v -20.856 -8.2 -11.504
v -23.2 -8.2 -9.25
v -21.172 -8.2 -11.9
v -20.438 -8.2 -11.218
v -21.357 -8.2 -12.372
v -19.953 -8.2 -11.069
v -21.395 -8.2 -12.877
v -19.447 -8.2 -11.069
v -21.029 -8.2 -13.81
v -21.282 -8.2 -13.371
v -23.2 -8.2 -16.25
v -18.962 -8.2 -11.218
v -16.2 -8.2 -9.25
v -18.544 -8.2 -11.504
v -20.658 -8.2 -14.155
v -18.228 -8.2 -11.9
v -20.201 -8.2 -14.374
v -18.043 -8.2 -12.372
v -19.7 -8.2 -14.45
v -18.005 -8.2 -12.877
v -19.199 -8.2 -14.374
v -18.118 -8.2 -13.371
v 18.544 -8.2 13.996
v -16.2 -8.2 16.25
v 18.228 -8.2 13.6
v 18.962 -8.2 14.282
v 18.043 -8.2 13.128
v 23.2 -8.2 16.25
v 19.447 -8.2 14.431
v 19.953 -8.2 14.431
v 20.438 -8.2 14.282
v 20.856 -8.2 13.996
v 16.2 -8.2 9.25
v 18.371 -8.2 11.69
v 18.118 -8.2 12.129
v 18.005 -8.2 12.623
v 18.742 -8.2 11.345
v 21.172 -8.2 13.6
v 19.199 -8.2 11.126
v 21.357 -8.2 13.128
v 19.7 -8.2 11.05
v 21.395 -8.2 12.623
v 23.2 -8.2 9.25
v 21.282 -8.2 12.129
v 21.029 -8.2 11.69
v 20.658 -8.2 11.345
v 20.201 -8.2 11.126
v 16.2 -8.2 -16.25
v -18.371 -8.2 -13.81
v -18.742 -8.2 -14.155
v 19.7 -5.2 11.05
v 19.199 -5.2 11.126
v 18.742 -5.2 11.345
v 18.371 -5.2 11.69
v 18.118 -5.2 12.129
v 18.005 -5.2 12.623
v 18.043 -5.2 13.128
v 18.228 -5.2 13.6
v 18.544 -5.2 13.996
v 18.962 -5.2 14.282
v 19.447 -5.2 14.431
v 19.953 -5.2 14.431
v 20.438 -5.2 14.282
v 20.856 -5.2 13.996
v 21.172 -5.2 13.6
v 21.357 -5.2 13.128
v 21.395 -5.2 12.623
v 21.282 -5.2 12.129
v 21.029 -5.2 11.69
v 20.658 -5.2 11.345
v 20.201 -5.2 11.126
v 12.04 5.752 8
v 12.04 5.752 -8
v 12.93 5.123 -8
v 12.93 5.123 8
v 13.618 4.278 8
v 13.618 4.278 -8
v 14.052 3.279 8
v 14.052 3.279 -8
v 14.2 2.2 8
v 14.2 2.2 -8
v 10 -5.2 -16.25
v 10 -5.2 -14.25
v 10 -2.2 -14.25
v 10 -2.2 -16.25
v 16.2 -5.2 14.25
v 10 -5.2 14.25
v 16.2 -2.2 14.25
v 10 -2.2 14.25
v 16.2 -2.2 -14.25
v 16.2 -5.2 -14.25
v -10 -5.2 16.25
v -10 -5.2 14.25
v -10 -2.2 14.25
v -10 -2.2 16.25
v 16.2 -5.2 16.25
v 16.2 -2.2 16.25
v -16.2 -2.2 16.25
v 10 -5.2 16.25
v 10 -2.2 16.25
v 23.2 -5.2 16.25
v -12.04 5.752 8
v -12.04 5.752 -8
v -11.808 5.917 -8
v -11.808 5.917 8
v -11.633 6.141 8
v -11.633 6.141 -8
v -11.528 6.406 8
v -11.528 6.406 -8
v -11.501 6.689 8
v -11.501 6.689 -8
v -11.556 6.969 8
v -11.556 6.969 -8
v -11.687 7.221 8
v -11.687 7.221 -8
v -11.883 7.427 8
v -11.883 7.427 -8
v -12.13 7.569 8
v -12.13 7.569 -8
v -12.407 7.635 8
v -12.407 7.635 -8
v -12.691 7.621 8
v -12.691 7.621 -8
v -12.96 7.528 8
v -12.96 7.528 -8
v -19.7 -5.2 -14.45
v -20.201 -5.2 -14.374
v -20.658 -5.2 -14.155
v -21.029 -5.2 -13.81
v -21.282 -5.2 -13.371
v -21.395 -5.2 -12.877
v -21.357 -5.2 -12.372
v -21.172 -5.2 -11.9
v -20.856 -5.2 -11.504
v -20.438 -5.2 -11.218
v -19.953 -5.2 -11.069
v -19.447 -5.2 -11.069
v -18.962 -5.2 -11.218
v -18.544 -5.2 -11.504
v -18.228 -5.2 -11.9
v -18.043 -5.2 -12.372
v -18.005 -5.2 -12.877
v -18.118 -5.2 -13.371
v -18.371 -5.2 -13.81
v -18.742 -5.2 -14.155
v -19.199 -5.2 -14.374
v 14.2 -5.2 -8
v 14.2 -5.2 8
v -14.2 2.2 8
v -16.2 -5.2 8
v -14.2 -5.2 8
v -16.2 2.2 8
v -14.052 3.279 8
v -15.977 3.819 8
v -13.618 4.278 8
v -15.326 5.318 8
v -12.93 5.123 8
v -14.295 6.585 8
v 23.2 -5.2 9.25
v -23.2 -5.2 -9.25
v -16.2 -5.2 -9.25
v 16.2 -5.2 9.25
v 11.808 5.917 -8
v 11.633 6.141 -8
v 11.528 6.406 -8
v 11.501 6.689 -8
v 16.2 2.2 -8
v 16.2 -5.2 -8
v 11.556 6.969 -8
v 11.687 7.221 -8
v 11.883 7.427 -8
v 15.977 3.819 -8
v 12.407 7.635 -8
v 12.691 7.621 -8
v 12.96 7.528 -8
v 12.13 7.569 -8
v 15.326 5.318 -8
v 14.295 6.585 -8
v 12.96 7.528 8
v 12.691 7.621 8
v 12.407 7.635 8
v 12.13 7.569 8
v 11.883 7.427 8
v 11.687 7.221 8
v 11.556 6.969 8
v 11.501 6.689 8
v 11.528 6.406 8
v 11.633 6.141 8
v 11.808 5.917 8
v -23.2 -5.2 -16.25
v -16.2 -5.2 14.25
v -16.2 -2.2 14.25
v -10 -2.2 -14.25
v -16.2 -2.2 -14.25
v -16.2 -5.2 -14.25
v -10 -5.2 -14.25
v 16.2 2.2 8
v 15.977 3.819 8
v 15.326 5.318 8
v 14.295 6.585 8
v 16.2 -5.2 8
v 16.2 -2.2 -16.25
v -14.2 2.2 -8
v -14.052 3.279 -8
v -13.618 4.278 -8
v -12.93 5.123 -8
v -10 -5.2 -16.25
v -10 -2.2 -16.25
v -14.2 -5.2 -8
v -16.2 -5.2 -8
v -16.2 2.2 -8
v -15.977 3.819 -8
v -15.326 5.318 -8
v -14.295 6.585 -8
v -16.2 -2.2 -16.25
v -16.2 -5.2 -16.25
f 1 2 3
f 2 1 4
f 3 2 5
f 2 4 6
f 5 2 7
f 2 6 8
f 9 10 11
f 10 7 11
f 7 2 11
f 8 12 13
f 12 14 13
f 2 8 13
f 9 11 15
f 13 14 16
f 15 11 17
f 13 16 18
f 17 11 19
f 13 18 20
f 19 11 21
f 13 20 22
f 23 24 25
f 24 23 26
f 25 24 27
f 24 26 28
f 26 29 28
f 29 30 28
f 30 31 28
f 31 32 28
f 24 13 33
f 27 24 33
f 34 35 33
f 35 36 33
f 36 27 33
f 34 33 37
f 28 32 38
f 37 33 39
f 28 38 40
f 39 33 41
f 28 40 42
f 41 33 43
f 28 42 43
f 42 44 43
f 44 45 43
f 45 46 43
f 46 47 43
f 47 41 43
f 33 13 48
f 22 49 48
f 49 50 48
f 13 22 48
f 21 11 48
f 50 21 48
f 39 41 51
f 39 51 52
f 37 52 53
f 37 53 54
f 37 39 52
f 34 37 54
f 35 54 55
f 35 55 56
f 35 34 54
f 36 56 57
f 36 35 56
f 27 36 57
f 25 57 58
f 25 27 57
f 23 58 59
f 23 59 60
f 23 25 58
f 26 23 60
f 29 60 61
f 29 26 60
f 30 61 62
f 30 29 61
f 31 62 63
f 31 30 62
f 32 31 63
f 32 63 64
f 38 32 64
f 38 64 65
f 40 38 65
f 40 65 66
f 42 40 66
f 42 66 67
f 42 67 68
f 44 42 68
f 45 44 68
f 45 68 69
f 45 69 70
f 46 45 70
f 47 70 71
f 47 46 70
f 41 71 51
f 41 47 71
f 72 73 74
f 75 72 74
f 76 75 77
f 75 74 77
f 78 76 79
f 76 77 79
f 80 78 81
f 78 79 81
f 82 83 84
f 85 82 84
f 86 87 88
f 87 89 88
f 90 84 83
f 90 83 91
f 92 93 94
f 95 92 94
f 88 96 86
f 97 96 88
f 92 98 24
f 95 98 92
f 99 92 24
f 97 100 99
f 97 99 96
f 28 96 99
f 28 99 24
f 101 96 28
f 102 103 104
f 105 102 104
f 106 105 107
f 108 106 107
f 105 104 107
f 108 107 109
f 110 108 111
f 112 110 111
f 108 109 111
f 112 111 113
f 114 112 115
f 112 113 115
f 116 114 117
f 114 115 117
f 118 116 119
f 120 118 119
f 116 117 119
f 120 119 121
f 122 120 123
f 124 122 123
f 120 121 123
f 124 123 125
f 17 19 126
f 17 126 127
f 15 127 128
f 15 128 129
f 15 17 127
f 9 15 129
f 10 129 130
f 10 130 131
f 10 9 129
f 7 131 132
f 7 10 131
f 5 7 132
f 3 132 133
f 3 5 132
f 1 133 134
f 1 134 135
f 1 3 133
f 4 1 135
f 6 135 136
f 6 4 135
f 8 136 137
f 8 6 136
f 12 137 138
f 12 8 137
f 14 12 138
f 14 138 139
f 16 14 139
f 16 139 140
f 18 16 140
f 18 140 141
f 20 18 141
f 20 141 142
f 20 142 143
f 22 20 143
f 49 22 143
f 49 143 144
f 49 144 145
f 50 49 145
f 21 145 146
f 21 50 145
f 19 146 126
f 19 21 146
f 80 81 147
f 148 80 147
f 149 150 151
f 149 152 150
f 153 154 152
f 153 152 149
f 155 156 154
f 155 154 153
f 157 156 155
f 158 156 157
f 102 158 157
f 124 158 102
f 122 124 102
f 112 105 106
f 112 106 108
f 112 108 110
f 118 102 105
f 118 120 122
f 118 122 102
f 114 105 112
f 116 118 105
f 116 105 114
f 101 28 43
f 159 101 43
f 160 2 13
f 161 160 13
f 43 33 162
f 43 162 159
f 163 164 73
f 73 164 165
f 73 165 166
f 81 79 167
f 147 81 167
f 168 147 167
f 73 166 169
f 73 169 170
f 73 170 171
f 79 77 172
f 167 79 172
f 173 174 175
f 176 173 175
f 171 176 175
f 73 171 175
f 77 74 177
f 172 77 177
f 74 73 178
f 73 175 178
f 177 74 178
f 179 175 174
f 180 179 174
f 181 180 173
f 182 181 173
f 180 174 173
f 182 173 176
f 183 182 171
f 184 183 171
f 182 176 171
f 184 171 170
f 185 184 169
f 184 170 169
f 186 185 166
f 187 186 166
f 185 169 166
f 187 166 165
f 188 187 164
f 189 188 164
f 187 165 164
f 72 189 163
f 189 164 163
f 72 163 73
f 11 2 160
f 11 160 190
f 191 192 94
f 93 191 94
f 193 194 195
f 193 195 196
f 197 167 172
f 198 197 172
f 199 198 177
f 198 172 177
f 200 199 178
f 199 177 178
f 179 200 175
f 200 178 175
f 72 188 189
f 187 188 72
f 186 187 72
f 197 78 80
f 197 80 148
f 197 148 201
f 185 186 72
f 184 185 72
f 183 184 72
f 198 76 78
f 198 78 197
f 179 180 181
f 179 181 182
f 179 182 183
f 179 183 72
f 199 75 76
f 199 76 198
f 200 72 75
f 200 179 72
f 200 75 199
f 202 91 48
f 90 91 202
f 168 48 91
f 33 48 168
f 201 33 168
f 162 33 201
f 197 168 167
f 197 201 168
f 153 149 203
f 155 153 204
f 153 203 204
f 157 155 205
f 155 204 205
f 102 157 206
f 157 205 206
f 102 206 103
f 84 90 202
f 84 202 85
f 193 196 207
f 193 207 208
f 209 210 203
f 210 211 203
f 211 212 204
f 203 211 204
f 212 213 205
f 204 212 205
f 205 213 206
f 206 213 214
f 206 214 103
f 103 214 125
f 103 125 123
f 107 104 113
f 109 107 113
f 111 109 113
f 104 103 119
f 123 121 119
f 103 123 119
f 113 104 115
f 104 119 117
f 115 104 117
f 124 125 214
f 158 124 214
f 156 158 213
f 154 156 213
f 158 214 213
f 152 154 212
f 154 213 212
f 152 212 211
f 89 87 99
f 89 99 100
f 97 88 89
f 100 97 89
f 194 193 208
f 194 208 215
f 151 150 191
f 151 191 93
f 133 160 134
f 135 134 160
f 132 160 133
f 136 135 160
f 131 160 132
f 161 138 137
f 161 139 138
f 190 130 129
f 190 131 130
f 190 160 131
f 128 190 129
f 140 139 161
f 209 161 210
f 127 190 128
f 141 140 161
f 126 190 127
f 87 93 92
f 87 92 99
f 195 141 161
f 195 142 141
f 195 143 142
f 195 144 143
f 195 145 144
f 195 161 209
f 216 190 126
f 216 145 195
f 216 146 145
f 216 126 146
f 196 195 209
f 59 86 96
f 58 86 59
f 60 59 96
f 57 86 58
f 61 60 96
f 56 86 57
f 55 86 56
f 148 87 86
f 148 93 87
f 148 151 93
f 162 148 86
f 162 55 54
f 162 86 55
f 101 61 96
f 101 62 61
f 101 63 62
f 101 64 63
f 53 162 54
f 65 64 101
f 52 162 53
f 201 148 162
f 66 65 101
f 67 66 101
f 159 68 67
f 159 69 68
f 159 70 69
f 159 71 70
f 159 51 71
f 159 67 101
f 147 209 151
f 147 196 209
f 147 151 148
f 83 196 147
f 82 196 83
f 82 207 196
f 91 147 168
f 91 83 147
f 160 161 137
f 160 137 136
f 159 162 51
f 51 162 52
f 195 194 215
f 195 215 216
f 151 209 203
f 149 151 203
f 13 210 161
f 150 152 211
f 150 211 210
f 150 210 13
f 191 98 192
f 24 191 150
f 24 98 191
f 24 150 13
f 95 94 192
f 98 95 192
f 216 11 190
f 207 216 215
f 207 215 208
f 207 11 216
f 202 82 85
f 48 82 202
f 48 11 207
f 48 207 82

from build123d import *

# Parameters (mm, degrees)
BOSS_EXTRUDE1_DEPTH      = 14.25
BOSS_EXTRUDE1_DEPTH_BACK = 14.25
BOSS_EXTRUDE2_START      = 14.25
SKETCH1_3_W              = 2
SKETCH1_3_H              = 3
SKETCH1_3_W_2            = 4.2
BOSS_EXTRUDE2_DEPTH      = 2
BOSS_EXTRUDE3_START      = -14.25
SKETCH1_6_W              = 2
SKETCH1_6_H              = 3
SKETCH1_6_W_2            = 4.2
BOSS_EXTRUDE3_DEPTH      = 2
BOSS_EXTRUDE4_DEPTH      = 8
BOSS_EXTRUDE4_DEPTH_BACK = 8
SKETCH1_7_W              = 2
SKETCH1_7_H              = 3
SKETCH1_7_R              = 1
BOSS_EXTRUDE5_START      = -8.2
SKETCH2_W                = 7
SKETCH2_H                = 7
SKETCH2_R                = 1.7
BOSS_EXTRUDE5_DEPTH      = 3


with BuildPart() as part:
    # Sketch1 → Boss-Extrude1 (new, two sides: drawn at the far end of the back side and taken through both)
    with BuildSketch(Plane.XY.offset(-BOSS_EXTRUDE1_DEPTH_BACK)):
        Polygon((-14.2, -5.2), (-16.2, -5.2), (-16.2, -8.2), (16.2, -8.2), (16.2, -5.2), (14.2, -5.2), (10, -5.2), (-10, -5.2), align=None)
    extrude(amount=BOSS_EXTRUDE1_DEPTH + BOSS_EXTRUDE1_DEPTH_BACK)

    # Sketch1<3> → Boss-Extrude2 (add)
    with BuildSketch(Plane.XY.offset(BOSS_EXTRUDE2_START)):
        Polygon((-14.2, -5.2), (-16.2, -5.2), (-16.2, -8.2), (16.2, -8.2), (16.2, -5.2), (14.2, -5.2), (10, -5.2), (-10, -5.2), align=None)
        with Locations((-15.2, -3.7)):
            Rectangle(SKETCH1_3_W, SKETCH1_3_H)
        with Locations((-12.1, -3.7)):
            Rectangle(SKETCH1_3_W_2, SKETCH1_3_H)
        with Locations((12.1, -3.7)):
            Rectangle(SKETCH1_3_W_2, SKETCH1_3_H)
        with Locations((15.2, -3.7)):
            Rectangle(SKETCH1_3_W, SKETCH1_3_H)
    extrude(amount=BOSS_EXTRUDE2_DEPTH)

    # Sketch1<6> → Boss-Extrude3 (add)
    with BuildSketch(Plane.XY.offset(BOSS_EXTRUDE3_START)):
        with Locations((-15.2, -3.7)):
            Rectangle(SKETCH1_6_W, SKETCH1_6_H)
        with Locations((-12.1, -3.7)):
            Rectangle(SKETCH1_6_W_2, SKETCH1_6_H)
        Polygon((-14.2, -5.2), (-16.2, -5.2), (-16.2, -8.2), (16.2, -8.2), (16.2, -5.2), (14.2, -5.2), (10, -5.2), (-10, -5.2), align=None)
        with Locations((12.1, -3.7)):
            Rectangle(SKETCH1_6_W_2, SKETCH1_6_H)
        with Locations((15.2, -3.7)):
            Rectangle(SKETCH1_6_W, SKETCH1_6_H)
    extrude(amount=-BOSS_EXTRUDE3_DEPTH)

    # Sketch1<7> → Boss-Extrude4 (add, two sides: drawn at the far end of the back side and taken through both)
    with BuildSketch(Plane.XY.offset(-BOSS_EXTRUDE4_DEPTH_BACK)):
        with Locations((-15.2, -3.7)):
            Rectangle(SKETCH1_7_W, SKETCH1_7_H)
        with BuildLine():
            Line((-16.2, 2.2), (-16.2, -2.2))
            Line((-16.2, -2.2), (-14.2, -2.2))
            Line((-14.2, -2.2), (-14.2, 2.2))
            ThreePointArc((-14.2, 2.2), (-13.617601514, 4.278460942), (-12.040000055, 5.751675632))
            ThreePointArc((-12.040000055, 5.751675632), (-13.387918942, 6.179594627), (-12.959999953, 7.527513516))
            ThreePointArc((-12.959999953, 7.527513516), (-15.326402233, 5.317691476), (-16.2, 2.2))
        make_face()
        with Locations((-12.5, 6.639594576)):
            Circle(SKETCH1_7_R)
        with Locations((12.5, 6.639594576)):
            Circle(SKETCH1_7_R)
        with BuildLine():
            Line((14.2, 2.2), (14.2, -2.2))
            Line((14.2, -2.2), (16.2, -2.2))
            Line((16.2, -2.2), (16.2, 2.2))
            ThreePointArc((16.2, 2.2), (15.326402246, 5.317691455), (12.959999996, 7.527513493))
            ThreePointArc((12.959999996, 7.527513493), (13.354400373, 7.15920982), (13.5, 6.639594576))
            ThreePointArc((13.5, 6.639594576), (13.019615242, 5.785194201), (12.039999999, 5.751675662))
            ThreePointArc((12.039999999, 5.751675662), (13.617601498, 4.27846097), (14.2, 2.2))
        make_face()
        with Locations((15.2, -3.7)):
            Rectangle(SKETCH1_7_W, SKETCH1_7_H)
    extrude(amount=BOSS_EXTRUDE4_DEPTH + BOSS_EXTRUDE4_DEPTH_BACK)

    # Sketch2 → Boss-Extrude5 (add)
    # profile 1 of 2: a face of its own
    with BuildSketch(Plane(origin=(0, 0, 0), x_dir=(1, 0, 0), z_dir=(0, 1, 0)).offset(BOSS_EXTRUDE5_START)):
        with Locations((-19.7, 12.75)):
            Rectangle(SKETCH2_W, SKETCH2_H)
        with Locations(Location((-19.7, 12.75, 0), (0, 0, 90))):
            Circle(SKETCH2_R, mode=Mode.SUBTRACT)
    # profile 2 of 2: a face of its own
    with BuildSketch(Plane(origin=(0, 0, 0), x_dir=(1, 0, 0), z_dir=(0, 1, 0)).offset(BOSS_EXTRUDE5_START)):
        with Locations((19.7, -12.75)):
            Rectangle(SKETCH2_W, SKETCH2_H)
        with Locations(Location((19.7, -12.75, 0), (0, 0, 90))):
            Circle(SKETCH2_R, mode=Mode.SUBTRACT)
    extrude(amount=BOSS_EXTRUDE5_DEPTH)


solid = part.part
